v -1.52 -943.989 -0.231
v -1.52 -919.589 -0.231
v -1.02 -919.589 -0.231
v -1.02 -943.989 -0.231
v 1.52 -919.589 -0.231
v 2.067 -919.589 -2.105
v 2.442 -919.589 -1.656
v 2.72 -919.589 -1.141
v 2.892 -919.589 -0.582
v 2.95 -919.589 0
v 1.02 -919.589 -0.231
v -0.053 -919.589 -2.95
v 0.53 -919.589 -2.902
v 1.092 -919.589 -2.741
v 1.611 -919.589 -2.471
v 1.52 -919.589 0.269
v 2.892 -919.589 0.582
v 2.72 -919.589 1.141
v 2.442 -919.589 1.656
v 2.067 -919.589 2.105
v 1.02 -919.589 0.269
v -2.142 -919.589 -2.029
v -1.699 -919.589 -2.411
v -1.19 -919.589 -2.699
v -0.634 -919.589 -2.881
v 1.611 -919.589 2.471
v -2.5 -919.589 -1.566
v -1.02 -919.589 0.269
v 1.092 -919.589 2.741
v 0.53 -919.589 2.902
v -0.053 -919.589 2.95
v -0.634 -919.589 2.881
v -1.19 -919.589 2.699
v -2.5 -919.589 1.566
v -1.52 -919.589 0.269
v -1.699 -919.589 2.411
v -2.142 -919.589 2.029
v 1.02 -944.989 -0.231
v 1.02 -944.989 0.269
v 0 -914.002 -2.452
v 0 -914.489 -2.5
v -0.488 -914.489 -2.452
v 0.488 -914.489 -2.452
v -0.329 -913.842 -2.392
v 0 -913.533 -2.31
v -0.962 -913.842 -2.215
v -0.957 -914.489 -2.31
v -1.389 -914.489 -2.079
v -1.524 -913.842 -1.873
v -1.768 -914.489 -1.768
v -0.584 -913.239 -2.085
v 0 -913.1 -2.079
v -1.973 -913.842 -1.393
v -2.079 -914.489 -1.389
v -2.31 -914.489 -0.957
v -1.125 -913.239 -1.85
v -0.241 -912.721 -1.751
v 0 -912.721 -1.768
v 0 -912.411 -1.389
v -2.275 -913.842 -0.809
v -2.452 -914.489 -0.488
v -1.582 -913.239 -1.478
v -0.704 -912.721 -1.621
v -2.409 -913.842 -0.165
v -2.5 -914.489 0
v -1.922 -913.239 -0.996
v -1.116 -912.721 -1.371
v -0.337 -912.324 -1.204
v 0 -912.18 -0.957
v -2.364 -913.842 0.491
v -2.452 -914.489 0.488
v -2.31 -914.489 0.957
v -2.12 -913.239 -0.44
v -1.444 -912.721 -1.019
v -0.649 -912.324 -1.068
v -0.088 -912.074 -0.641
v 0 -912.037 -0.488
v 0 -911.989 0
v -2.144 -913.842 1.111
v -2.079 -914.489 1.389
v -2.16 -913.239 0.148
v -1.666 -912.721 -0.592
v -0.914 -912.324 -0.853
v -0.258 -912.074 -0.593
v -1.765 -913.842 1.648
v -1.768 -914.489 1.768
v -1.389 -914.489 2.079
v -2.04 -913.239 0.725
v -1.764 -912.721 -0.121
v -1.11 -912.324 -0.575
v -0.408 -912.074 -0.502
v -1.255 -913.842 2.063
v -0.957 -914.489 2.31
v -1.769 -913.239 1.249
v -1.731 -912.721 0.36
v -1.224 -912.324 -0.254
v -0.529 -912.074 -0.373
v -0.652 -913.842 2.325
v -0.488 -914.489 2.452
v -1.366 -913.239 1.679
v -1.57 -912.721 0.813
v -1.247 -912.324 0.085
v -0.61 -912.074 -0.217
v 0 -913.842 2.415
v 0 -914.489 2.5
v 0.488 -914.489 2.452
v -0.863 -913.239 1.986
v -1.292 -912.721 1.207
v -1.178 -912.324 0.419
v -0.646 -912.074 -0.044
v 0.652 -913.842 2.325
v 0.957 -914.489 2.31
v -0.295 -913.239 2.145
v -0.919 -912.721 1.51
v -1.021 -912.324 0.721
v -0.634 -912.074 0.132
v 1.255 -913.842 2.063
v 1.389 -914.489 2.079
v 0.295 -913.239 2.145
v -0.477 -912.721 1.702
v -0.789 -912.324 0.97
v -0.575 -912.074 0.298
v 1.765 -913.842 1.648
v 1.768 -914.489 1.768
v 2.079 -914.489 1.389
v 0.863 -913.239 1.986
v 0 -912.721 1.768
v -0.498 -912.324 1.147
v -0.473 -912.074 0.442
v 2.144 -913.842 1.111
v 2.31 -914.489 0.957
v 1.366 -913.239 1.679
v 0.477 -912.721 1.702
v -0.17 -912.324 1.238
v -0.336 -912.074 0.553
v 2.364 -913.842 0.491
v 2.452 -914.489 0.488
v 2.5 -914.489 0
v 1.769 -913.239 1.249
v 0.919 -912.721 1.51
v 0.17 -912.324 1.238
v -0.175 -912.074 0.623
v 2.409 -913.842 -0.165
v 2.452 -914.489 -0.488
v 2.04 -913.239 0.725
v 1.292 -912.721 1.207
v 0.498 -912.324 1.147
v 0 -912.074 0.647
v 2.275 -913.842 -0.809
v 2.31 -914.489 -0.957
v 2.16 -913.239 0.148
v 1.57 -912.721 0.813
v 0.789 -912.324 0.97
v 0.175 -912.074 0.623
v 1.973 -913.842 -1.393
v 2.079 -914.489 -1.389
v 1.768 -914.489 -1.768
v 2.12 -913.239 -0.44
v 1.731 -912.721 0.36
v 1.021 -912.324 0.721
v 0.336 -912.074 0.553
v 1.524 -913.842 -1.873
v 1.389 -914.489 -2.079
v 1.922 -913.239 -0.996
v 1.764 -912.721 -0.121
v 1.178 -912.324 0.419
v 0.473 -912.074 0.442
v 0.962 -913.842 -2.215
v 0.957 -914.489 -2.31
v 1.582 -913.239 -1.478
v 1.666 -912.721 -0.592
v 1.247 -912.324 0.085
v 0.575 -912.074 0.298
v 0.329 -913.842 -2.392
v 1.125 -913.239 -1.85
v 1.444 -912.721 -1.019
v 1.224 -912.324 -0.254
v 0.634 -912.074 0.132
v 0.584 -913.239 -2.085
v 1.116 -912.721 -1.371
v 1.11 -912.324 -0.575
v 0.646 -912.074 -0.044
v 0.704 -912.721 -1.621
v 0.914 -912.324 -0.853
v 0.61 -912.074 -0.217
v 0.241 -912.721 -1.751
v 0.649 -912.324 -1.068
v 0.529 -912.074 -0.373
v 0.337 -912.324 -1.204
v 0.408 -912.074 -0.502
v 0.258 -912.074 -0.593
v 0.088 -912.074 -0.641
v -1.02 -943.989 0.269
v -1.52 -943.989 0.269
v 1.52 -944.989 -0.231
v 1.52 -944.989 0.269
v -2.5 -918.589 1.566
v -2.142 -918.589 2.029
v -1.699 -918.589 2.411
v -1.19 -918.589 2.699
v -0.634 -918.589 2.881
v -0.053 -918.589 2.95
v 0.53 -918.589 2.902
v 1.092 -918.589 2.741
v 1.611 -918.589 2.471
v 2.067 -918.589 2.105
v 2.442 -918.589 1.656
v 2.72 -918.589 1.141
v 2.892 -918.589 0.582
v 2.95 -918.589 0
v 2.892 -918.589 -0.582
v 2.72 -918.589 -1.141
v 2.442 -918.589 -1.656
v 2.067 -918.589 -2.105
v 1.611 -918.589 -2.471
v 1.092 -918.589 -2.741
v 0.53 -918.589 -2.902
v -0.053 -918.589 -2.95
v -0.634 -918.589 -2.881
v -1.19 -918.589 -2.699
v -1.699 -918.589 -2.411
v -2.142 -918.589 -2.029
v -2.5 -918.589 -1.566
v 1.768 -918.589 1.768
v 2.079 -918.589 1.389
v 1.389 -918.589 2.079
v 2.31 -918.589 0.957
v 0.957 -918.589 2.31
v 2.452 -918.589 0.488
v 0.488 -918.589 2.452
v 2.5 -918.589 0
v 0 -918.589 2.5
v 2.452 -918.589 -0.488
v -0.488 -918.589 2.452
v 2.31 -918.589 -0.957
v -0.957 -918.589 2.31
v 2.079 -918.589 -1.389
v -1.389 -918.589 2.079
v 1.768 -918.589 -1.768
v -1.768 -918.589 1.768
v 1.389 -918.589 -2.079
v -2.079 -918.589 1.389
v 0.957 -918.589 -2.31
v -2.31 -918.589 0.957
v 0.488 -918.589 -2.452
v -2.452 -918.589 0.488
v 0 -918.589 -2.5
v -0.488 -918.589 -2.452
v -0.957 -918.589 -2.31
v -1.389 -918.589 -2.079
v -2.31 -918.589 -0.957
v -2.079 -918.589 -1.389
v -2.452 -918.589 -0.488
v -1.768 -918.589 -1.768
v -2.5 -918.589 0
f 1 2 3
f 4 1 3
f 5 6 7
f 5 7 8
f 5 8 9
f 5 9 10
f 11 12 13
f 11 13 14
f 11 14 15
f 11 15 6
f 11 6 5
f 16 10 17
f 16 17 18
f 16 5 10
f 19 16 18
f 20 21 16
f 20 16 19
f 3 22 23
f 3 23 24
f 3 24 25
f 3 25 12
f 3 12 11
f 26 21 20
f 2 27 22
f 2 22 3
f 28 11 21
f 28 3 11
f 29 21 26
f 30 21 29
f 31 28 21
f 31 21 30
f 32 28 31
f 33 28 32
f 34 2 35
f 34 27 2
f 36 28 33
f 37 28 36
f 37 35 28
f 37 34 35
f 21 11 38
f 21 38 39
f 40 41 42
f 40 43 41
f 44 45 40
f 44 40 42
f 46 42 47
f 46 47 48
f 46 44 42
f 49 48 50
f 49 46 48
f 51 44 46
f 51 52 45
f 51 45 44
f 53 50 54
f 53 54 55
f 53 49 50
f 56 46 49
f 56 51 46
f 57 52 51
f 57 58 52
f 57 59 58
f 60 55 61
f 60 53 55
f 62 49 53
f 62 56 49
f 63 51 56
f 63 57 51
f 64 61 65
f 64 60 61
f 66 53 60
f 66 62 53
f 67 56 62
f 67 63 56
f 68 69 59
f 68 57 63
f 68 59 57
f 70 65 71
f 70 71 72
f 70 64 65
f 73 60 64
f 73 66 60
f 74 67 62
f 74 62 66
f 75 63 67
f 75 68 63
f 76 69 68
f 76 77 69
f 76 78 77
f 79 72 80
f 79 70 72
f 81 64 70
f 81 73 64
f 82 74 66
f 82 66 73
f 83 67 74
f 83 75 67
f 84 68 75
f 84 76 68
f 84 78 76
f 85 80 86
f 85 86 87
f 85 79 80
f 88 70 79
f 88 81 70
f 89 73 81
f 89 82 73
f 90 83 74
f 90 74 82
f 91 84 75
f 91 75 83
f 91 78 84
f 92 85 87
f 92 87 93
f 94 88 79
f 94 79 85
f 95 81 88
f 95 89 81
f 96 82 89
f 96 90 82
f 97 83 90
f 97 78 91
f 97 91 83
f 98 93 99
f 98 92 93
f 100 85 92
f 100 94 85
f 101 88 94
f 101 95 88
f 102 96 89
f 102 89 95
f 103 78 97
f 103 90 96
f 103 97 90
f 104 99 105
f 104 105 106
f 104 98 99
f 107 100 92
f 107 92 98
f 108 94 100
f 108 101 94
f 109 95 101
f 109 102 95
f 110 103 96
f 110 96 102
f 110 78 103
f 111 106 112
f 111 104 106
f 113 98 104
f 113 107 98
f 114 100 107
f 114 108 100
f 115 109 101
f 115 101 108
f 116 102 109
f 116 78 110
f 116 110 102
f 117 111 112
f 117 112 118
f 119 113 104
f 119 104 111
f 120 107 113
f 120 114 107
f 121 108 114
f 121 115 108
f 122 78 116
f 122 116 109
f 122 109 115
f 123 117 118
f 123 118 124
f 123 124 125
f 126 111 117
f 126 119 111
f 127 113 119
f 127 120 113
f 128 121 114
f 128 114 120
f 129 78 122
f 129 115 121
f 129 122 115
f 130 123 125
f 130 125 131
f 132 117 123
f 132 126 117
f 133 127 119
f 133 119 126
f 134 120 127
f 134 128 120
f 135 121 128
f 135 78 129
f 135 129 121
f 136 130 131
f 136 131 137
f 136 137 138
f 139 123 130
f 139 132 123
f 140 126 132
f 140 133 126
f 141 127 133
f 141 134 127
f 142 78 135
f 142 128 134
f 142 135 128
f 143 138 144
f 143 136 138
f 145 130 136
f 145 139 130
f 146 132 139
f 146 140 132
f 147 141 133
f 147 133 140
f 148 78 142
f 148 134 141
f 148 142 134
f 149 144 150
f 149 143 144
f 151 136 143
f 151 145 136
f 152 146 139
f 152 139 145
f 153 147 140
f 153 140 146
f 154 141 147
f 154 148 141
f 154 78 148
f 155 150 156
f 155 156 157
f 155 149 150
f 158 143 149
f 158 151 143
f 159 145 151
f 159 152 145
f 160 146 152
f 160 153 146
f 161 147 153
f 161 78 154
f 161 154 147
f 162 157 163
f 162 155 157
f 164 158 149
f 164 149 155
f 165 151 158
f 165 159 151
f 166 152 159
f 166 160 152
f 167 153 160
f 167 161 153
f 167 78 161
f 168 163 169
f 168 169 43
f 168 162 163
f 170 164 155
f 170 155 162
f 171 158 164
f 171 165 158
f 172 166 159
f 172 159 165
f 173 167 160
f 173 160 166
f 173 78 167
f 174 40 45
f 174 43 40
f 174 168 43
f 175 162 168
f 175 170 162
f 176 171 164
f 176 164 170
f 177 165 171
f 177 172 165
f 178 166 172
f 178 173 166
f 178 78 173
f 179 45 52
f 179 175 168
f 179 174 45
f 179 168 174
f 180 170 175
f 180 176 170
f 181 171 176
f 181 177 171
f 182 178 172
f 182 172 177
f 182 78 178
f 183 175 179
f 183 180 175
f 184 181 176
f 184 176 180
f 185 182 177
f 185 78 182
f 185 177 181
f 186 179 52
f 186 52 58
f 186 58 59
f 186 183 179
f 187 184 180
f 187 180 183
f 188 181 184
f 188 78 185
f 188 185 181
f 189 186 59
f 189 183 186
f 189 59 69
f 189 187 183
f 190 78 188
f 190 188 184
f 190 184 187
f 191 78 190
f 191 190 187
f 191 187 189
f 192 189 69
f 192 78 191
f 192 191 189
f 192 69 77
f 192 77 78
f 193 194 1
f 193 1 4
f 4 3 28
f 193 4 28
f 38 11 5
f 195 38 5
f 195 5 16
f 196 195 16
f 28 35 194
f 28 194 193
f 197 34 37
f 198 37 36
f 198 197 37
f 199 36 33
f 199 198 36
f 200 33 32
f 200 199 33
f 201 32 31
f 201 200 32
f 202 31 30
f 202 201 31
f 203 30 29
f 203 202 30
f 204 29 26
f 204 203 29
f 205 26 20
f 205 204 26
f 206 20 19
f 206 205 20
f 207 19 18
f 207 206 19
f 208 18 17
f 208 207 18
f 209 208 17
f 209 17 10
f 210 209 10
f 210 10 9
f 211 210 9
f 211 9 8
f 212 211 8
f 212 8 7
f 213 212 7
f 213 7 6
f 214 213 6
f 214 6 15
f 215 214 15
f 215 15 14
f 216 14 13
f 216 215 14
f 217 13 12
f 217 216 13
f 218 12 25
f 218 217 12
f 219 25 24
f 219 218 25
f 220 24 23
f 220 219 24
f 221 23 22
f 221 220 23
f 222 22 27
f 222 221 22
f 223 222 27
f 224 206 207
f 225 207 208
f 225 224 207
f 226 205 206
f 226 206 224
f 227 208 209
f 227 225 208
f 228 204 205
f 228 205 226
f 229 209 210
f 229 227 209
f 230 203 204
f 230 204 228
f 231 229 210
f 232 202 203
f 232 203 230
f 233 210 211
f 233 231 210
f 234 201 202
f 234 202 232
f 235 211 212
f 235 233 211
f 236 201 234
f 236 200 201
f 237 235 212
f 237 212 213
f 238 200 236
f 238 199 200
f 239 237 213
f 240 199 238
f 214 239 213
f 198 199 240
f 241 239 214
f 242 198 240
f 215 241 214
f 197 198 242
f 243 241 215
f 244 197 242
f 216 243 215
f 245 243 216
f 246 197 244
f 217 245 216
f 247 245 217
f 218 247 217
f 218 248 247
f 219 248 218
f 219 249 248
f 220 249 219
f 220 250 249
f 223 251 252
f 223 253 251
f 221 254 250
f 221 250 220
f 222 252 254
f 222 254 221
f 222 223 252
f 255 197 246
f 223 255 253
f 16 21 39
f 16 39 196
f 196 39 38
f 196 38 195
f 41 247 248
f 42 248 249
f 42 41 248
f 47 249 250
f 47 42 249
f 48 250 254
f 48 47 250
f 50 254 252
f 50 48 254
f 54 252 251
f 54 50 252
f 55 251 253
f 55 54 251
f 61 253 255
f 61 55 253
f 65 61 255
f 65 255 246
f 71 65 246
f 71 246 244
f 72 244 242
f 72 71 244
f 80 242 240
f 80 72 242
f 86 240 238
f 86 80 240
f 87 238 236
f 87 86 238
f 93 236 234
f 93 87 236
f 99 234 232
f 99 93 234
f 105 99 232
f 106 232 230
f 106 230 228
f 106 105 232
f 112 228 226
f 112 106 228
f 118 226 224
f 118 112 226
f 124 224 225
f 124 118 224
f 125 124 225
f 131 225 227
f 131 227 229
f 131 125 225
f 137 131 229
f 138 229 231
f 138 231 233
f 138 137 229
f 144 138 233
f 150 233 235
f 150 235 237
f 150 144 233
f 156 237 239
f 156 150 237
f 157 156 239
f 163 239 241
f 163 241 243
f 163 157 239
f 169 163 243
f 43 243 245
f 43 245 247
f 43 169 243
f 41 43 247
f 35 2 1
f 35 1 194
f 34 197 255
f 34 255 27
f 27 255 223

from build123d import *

# Parameters (mm, degrees)
CROQUIS3_W              = 0.5
CROQUIS3_H              = 0.5
SALIENTE_EXTRUIR3_DEPTH = 25.4
CROQUIS4_W              = 0.912534335
CROQUIS4_H              = 5.586103973
CORTAR_EXTRUIR1_DEPTH   = 25.4
CORTAR_EXTRUIR2_REACH   = 946.999
CROQUIS5_W              = 0.5
CROQUIS5_H              = 1


with BuildPart() as part:
    # Croquis2 → Revolución1 (revolve)
    with BuildSketch(Plane(origin=(0, 0, 0), x_dir=(0, 0, -1), z_dir=(1, 0, 0))):
        with BuildLine():
            Line((0, -919.589259582), (2.95, -919.589259582))
            Line((2.95, -919.589259582), (2.95, -918.589259582))
            Line((2.95, -918.589259582), (2.5, -918.589259582))
            Line((2.5, -918.589259582), (2.5, -914.489259582))
            ThreePointArc((2.5, -914.489259582), (1.767766953, -912.721492629), (0, -911.989259582))
            Line((0, -911.989259582), (0, -919.589259582))
        make_face()
    revolve(axis=Axis((0, -1491.471633976, 0), (0, 1, 0)))

    # Croquis3 → Saliente-Extruir3 (add)
    with BuildSketch(Plane.XZ.offset(919.589259582)):
        with Locations((1.27, 0.018814001)):
            Rectangle(CROQUIS3_W, CROQUIS3_H)
        with Locations((-1.27, 0.018814001)):
            Rectangle(CROQUIS3_W, CROQUIS3_H)
    extrude(amount=SALIENTE_EXTRUIR3_DEPTH)

    # Croquis4 → Cortar-Extruir1 (cut)
    with BuildSketch(Plane(origin=(0, -918.589259582, 0), x_dir=(1, 0, 0), z_dir=(0, 1, 0))):
        with Locations((-2.956267168, 0.283432647)):
            Rectangle(CROQUIS4_W, CROQUIS4_H)
    extrude(amount=-CORTAR_EXTRUIR1_DEPTH, mode=Mode.SUBTRACT)

    # Croquis5 → Cortar-Extruir2 (cut, up to next)
    with BuildSketch(Plane.XY.offset(0.268814001), mode=Mode.PRIVATE) as cortar_extruir2_sk1:
        with Locations((-1.27, -944.489259582)):
            Rectangle(CROQUIS5_W, CROQUIS5_H)
    cortar_extruir2_tool1 = extrude(cortar_extruir2_sk1.sketch, amount=-CORTAR_EXTRUIR2_REACH, mode=Mode.PRIVATE) & part.part
    add(cortar_extruir2_tool1.solids().sort_by_distance((-1.27, -944.48926, 0.268814))[0], mode=Mode.SUBTRACT)


solid = part.part
